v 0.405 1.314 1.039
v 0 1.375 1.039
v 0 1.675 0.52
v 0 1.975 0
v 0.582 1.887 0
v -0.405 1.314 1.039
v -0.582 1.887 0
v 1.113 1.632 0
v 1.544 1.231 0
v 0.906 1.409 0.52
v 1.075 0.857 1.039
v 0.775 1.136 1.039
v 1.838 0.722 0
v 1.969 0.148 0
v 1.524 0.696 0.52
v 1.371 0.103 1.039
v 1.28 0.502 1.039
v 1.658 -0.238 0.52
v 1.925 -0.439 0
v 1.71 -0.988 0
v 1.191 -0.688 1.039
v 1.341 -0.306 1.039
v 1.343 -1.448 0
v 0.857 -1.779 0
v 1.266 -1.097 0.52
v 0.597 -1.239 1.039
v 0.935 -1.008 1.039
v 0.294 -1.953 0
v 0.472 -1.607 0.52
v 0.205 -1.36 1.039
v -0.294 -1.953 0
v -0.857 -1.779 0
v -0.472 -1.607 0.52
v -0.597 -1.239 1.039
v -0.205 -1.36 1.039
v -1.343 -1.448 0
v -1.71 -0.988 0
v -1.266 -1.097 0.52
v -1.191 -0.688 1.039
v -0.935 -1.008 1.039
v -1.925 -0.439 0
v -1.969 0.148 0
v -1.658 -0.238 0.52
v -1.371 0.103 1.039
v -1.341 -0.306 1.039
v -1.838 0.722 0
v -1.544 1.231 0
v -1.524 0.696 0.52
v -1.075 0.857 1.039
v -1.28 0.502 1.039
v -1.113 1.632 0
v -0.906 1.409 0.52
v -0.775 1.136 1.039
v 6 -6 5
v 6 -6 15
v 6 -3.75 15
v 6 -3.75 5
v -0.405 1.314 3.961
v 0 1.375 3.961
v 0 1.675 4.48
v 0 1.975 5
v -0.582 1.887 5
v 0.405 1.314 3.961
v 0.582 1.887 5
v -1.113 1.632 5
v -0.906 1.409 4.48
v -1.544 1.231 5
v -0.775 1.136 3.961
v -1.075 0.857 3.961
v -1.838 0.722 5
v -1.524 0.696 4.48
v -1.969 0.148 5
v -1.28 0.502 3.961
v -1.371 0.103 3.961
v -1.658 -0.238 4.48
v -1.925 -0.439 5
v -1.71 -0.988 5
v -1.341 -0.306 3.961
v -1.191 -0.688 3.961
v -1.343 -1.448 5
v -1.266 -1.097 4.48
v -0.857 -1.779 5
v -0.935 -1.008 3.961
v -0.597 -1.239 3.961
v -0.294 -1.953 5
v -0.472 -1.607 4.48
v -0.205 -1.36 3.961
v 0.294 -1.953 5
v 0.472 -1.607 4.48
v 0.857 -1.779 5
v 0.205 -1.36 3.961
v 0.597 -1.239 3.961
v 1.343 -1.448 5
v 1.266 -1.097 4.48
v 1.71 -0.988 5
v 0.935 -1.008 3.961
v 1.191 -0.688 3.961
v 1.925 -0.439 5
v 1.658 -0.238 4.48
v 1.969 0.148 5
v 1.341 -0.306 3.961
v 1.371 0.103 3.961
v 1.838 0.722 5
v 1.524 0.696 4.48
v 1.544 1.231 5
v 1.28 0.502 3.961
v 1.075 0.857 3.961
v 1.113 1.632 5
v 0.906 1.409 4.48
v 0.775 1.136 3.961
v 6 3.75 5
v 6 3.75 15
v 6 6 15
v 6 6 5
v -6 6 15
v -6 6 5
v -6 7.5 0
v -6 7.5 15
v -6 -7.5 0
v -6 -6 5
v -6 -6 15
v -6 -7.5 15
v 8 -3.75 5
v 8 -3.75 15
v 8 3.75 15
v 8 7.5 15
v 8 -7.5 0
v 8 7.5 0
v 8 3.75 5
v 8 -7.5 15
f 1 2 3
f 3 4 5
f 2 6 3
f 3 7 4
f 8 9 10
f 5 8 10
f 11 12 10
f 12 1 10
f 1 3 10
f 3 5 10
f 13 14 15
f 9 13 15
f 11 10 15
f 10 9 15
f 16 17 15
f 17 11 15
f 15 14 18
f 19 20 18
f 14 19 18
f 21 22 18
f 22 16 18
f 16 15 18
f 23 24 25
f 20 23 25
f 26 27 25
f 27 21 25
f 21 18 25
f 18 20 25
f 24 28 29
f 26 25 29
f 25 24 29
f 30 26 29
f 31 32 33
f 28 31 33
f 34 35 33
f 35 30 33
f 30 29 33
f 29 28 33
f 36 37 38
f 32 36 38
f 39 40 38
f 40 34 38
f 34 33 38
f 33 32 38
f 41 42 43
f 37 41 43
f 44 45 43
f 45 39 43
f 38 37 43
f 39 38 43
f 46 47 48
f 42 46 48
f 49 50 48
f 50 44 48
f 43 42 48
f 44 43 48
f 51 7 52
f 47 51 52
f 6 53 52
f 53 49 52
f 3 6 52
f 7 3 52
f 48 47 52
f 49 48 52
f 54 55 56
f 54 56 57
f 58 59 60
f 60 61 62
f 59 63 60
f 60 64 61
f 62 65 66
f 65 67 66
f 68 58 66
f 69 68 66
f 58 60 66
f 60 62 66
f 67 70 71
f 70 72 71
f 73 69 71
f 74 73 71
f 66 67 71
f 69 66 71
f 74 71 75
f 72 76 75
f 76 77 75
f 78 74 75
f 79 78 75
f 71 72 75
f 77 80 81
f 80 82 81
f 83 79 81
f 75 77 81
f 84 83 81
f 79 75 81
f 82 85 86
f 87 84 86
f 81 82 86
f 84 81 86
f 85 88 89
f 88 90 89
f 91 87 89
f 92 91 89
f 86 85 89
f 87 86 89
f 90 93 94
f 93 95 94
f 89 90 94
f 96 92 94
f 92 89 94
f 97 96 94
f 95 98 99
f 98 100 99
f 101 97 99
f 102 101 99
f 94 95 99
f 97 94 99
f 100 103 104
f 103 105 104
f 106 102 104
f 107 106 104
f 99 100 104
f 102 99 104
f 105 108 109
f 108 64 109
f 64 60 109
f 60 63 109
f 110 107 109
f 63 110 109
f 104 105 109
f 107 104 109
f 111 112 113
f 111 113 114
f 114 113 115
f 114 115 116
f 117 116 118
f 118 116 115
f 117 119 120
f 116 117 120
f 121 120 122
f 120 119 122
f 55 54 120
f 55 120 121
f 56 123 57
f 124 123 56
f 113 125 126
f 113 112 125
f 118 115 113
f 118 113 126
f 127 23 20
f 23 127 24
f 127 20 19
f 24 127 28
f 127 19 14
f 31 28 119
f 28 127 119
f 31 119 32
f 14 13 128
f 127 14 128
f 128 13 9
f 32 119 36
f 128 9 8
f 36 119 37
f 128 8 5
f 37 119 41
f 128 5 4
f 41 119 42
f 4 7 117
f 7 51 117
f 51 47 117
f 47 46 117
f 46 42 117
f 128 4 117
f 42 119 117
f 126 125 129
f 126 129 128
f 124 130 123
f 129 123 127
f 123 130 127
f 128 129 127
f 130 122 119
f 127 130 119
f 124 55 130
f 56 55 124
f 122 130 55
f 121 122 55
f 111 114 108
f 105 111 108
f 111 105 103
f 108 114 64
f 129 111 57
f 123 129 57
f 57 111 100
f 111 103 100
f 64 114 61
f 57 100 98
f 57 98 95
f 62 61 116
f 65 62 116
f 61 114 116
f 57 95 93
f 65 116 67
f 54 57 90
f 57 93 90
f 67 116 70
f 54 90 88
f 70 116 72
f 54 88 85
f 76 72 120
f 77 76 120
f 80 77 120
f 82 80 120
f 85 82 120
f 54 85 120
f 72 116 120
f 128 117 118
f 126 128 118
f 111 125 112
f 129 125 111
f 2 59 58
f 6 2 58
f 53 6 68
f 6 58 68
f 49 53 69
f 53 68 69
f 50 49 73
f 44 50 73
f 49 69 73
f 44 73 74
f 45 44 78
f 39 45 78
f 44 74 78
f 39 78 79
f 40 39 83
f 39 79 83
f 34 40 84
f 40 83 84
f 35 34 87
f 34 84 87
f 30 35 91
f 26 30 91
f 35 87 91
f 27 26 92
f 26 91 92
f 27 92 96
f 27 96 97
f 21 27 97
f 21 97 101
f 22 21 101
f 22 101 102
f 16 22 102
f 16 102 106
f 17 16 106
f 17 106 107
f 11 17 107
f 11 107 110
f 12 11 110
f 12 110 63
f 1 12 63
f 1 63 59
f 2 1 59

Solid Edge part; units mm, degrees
sketch "Sketch1" plane through (0, 0, 0) normal (1, 0, 0) x (0, 1, 0)
  line L0 (-7.5, 15) -> (-7.5, 0)
  line L1 (-7.5, 0) -> (7.5, 0)
  line L2 (7.5, 0) -> (7.5, 15)
  line L3 (7.5, 15) -> (6, 15)
  line L4 (6, 15) -> (6, 5)
  line L5 (6, 5) -> (-6, 5)
  line L6 (-6, 5) -> (-6, 15)
  line L7 (-6, 15) -> (-7.5, 15)
  dimension "D1" = 15
  dimension "D2" = 12
  dimension "D3" = 15
  dimension "D4" = 10
extrude "Protrusion1" add sketch "Sketch1" along normal mid plane 12
hole "hole" at (0, 0, 0) direction (0, 0, 1) diameter 2.75 depth 30 tip angle 118 start chamfer 0.6 start chamfer angle 30 end chamfer 0.6 end chamfer angle 30
sketch "Sketch2" plane through (6, 0, 7.5) normal (1, 0, 0) x (0, 0, 1)
  line L0 (-7.5, 7.5) -> (7.5, 7.5)
  line L1 (7.5, 7.5) -> (7.5, -7.5)
  line L2 (7.5, -7.5) -> (-7.5, -7.5)
  line L3 (-7.5, -7.5) -> (-7.5, 7.5)
extrude "wall" add sketch "Sketch2" along normal blind 2
sketch "Sketch3" plane through (8, 0, 7.5) normal (1, 0, 0) x (0, -1, 0)
  line L0 (-3.75, -7.5) -> (3.75, -7.5)
  line L1 (3.75, 2.5) -> (3.75, -7.5)
  line L2 (-3.75, 2.5) -> (3.75, 2.5)
  line L3 (-3.75, -7.5) -> (-3.75, 2.5)
  dimension "D1" = 7.5
  dimension "D2" = 10
extrude "Cutout1" cut sketch "Sketch3" against normal up to next
properties material "Polyethylene, low density"
